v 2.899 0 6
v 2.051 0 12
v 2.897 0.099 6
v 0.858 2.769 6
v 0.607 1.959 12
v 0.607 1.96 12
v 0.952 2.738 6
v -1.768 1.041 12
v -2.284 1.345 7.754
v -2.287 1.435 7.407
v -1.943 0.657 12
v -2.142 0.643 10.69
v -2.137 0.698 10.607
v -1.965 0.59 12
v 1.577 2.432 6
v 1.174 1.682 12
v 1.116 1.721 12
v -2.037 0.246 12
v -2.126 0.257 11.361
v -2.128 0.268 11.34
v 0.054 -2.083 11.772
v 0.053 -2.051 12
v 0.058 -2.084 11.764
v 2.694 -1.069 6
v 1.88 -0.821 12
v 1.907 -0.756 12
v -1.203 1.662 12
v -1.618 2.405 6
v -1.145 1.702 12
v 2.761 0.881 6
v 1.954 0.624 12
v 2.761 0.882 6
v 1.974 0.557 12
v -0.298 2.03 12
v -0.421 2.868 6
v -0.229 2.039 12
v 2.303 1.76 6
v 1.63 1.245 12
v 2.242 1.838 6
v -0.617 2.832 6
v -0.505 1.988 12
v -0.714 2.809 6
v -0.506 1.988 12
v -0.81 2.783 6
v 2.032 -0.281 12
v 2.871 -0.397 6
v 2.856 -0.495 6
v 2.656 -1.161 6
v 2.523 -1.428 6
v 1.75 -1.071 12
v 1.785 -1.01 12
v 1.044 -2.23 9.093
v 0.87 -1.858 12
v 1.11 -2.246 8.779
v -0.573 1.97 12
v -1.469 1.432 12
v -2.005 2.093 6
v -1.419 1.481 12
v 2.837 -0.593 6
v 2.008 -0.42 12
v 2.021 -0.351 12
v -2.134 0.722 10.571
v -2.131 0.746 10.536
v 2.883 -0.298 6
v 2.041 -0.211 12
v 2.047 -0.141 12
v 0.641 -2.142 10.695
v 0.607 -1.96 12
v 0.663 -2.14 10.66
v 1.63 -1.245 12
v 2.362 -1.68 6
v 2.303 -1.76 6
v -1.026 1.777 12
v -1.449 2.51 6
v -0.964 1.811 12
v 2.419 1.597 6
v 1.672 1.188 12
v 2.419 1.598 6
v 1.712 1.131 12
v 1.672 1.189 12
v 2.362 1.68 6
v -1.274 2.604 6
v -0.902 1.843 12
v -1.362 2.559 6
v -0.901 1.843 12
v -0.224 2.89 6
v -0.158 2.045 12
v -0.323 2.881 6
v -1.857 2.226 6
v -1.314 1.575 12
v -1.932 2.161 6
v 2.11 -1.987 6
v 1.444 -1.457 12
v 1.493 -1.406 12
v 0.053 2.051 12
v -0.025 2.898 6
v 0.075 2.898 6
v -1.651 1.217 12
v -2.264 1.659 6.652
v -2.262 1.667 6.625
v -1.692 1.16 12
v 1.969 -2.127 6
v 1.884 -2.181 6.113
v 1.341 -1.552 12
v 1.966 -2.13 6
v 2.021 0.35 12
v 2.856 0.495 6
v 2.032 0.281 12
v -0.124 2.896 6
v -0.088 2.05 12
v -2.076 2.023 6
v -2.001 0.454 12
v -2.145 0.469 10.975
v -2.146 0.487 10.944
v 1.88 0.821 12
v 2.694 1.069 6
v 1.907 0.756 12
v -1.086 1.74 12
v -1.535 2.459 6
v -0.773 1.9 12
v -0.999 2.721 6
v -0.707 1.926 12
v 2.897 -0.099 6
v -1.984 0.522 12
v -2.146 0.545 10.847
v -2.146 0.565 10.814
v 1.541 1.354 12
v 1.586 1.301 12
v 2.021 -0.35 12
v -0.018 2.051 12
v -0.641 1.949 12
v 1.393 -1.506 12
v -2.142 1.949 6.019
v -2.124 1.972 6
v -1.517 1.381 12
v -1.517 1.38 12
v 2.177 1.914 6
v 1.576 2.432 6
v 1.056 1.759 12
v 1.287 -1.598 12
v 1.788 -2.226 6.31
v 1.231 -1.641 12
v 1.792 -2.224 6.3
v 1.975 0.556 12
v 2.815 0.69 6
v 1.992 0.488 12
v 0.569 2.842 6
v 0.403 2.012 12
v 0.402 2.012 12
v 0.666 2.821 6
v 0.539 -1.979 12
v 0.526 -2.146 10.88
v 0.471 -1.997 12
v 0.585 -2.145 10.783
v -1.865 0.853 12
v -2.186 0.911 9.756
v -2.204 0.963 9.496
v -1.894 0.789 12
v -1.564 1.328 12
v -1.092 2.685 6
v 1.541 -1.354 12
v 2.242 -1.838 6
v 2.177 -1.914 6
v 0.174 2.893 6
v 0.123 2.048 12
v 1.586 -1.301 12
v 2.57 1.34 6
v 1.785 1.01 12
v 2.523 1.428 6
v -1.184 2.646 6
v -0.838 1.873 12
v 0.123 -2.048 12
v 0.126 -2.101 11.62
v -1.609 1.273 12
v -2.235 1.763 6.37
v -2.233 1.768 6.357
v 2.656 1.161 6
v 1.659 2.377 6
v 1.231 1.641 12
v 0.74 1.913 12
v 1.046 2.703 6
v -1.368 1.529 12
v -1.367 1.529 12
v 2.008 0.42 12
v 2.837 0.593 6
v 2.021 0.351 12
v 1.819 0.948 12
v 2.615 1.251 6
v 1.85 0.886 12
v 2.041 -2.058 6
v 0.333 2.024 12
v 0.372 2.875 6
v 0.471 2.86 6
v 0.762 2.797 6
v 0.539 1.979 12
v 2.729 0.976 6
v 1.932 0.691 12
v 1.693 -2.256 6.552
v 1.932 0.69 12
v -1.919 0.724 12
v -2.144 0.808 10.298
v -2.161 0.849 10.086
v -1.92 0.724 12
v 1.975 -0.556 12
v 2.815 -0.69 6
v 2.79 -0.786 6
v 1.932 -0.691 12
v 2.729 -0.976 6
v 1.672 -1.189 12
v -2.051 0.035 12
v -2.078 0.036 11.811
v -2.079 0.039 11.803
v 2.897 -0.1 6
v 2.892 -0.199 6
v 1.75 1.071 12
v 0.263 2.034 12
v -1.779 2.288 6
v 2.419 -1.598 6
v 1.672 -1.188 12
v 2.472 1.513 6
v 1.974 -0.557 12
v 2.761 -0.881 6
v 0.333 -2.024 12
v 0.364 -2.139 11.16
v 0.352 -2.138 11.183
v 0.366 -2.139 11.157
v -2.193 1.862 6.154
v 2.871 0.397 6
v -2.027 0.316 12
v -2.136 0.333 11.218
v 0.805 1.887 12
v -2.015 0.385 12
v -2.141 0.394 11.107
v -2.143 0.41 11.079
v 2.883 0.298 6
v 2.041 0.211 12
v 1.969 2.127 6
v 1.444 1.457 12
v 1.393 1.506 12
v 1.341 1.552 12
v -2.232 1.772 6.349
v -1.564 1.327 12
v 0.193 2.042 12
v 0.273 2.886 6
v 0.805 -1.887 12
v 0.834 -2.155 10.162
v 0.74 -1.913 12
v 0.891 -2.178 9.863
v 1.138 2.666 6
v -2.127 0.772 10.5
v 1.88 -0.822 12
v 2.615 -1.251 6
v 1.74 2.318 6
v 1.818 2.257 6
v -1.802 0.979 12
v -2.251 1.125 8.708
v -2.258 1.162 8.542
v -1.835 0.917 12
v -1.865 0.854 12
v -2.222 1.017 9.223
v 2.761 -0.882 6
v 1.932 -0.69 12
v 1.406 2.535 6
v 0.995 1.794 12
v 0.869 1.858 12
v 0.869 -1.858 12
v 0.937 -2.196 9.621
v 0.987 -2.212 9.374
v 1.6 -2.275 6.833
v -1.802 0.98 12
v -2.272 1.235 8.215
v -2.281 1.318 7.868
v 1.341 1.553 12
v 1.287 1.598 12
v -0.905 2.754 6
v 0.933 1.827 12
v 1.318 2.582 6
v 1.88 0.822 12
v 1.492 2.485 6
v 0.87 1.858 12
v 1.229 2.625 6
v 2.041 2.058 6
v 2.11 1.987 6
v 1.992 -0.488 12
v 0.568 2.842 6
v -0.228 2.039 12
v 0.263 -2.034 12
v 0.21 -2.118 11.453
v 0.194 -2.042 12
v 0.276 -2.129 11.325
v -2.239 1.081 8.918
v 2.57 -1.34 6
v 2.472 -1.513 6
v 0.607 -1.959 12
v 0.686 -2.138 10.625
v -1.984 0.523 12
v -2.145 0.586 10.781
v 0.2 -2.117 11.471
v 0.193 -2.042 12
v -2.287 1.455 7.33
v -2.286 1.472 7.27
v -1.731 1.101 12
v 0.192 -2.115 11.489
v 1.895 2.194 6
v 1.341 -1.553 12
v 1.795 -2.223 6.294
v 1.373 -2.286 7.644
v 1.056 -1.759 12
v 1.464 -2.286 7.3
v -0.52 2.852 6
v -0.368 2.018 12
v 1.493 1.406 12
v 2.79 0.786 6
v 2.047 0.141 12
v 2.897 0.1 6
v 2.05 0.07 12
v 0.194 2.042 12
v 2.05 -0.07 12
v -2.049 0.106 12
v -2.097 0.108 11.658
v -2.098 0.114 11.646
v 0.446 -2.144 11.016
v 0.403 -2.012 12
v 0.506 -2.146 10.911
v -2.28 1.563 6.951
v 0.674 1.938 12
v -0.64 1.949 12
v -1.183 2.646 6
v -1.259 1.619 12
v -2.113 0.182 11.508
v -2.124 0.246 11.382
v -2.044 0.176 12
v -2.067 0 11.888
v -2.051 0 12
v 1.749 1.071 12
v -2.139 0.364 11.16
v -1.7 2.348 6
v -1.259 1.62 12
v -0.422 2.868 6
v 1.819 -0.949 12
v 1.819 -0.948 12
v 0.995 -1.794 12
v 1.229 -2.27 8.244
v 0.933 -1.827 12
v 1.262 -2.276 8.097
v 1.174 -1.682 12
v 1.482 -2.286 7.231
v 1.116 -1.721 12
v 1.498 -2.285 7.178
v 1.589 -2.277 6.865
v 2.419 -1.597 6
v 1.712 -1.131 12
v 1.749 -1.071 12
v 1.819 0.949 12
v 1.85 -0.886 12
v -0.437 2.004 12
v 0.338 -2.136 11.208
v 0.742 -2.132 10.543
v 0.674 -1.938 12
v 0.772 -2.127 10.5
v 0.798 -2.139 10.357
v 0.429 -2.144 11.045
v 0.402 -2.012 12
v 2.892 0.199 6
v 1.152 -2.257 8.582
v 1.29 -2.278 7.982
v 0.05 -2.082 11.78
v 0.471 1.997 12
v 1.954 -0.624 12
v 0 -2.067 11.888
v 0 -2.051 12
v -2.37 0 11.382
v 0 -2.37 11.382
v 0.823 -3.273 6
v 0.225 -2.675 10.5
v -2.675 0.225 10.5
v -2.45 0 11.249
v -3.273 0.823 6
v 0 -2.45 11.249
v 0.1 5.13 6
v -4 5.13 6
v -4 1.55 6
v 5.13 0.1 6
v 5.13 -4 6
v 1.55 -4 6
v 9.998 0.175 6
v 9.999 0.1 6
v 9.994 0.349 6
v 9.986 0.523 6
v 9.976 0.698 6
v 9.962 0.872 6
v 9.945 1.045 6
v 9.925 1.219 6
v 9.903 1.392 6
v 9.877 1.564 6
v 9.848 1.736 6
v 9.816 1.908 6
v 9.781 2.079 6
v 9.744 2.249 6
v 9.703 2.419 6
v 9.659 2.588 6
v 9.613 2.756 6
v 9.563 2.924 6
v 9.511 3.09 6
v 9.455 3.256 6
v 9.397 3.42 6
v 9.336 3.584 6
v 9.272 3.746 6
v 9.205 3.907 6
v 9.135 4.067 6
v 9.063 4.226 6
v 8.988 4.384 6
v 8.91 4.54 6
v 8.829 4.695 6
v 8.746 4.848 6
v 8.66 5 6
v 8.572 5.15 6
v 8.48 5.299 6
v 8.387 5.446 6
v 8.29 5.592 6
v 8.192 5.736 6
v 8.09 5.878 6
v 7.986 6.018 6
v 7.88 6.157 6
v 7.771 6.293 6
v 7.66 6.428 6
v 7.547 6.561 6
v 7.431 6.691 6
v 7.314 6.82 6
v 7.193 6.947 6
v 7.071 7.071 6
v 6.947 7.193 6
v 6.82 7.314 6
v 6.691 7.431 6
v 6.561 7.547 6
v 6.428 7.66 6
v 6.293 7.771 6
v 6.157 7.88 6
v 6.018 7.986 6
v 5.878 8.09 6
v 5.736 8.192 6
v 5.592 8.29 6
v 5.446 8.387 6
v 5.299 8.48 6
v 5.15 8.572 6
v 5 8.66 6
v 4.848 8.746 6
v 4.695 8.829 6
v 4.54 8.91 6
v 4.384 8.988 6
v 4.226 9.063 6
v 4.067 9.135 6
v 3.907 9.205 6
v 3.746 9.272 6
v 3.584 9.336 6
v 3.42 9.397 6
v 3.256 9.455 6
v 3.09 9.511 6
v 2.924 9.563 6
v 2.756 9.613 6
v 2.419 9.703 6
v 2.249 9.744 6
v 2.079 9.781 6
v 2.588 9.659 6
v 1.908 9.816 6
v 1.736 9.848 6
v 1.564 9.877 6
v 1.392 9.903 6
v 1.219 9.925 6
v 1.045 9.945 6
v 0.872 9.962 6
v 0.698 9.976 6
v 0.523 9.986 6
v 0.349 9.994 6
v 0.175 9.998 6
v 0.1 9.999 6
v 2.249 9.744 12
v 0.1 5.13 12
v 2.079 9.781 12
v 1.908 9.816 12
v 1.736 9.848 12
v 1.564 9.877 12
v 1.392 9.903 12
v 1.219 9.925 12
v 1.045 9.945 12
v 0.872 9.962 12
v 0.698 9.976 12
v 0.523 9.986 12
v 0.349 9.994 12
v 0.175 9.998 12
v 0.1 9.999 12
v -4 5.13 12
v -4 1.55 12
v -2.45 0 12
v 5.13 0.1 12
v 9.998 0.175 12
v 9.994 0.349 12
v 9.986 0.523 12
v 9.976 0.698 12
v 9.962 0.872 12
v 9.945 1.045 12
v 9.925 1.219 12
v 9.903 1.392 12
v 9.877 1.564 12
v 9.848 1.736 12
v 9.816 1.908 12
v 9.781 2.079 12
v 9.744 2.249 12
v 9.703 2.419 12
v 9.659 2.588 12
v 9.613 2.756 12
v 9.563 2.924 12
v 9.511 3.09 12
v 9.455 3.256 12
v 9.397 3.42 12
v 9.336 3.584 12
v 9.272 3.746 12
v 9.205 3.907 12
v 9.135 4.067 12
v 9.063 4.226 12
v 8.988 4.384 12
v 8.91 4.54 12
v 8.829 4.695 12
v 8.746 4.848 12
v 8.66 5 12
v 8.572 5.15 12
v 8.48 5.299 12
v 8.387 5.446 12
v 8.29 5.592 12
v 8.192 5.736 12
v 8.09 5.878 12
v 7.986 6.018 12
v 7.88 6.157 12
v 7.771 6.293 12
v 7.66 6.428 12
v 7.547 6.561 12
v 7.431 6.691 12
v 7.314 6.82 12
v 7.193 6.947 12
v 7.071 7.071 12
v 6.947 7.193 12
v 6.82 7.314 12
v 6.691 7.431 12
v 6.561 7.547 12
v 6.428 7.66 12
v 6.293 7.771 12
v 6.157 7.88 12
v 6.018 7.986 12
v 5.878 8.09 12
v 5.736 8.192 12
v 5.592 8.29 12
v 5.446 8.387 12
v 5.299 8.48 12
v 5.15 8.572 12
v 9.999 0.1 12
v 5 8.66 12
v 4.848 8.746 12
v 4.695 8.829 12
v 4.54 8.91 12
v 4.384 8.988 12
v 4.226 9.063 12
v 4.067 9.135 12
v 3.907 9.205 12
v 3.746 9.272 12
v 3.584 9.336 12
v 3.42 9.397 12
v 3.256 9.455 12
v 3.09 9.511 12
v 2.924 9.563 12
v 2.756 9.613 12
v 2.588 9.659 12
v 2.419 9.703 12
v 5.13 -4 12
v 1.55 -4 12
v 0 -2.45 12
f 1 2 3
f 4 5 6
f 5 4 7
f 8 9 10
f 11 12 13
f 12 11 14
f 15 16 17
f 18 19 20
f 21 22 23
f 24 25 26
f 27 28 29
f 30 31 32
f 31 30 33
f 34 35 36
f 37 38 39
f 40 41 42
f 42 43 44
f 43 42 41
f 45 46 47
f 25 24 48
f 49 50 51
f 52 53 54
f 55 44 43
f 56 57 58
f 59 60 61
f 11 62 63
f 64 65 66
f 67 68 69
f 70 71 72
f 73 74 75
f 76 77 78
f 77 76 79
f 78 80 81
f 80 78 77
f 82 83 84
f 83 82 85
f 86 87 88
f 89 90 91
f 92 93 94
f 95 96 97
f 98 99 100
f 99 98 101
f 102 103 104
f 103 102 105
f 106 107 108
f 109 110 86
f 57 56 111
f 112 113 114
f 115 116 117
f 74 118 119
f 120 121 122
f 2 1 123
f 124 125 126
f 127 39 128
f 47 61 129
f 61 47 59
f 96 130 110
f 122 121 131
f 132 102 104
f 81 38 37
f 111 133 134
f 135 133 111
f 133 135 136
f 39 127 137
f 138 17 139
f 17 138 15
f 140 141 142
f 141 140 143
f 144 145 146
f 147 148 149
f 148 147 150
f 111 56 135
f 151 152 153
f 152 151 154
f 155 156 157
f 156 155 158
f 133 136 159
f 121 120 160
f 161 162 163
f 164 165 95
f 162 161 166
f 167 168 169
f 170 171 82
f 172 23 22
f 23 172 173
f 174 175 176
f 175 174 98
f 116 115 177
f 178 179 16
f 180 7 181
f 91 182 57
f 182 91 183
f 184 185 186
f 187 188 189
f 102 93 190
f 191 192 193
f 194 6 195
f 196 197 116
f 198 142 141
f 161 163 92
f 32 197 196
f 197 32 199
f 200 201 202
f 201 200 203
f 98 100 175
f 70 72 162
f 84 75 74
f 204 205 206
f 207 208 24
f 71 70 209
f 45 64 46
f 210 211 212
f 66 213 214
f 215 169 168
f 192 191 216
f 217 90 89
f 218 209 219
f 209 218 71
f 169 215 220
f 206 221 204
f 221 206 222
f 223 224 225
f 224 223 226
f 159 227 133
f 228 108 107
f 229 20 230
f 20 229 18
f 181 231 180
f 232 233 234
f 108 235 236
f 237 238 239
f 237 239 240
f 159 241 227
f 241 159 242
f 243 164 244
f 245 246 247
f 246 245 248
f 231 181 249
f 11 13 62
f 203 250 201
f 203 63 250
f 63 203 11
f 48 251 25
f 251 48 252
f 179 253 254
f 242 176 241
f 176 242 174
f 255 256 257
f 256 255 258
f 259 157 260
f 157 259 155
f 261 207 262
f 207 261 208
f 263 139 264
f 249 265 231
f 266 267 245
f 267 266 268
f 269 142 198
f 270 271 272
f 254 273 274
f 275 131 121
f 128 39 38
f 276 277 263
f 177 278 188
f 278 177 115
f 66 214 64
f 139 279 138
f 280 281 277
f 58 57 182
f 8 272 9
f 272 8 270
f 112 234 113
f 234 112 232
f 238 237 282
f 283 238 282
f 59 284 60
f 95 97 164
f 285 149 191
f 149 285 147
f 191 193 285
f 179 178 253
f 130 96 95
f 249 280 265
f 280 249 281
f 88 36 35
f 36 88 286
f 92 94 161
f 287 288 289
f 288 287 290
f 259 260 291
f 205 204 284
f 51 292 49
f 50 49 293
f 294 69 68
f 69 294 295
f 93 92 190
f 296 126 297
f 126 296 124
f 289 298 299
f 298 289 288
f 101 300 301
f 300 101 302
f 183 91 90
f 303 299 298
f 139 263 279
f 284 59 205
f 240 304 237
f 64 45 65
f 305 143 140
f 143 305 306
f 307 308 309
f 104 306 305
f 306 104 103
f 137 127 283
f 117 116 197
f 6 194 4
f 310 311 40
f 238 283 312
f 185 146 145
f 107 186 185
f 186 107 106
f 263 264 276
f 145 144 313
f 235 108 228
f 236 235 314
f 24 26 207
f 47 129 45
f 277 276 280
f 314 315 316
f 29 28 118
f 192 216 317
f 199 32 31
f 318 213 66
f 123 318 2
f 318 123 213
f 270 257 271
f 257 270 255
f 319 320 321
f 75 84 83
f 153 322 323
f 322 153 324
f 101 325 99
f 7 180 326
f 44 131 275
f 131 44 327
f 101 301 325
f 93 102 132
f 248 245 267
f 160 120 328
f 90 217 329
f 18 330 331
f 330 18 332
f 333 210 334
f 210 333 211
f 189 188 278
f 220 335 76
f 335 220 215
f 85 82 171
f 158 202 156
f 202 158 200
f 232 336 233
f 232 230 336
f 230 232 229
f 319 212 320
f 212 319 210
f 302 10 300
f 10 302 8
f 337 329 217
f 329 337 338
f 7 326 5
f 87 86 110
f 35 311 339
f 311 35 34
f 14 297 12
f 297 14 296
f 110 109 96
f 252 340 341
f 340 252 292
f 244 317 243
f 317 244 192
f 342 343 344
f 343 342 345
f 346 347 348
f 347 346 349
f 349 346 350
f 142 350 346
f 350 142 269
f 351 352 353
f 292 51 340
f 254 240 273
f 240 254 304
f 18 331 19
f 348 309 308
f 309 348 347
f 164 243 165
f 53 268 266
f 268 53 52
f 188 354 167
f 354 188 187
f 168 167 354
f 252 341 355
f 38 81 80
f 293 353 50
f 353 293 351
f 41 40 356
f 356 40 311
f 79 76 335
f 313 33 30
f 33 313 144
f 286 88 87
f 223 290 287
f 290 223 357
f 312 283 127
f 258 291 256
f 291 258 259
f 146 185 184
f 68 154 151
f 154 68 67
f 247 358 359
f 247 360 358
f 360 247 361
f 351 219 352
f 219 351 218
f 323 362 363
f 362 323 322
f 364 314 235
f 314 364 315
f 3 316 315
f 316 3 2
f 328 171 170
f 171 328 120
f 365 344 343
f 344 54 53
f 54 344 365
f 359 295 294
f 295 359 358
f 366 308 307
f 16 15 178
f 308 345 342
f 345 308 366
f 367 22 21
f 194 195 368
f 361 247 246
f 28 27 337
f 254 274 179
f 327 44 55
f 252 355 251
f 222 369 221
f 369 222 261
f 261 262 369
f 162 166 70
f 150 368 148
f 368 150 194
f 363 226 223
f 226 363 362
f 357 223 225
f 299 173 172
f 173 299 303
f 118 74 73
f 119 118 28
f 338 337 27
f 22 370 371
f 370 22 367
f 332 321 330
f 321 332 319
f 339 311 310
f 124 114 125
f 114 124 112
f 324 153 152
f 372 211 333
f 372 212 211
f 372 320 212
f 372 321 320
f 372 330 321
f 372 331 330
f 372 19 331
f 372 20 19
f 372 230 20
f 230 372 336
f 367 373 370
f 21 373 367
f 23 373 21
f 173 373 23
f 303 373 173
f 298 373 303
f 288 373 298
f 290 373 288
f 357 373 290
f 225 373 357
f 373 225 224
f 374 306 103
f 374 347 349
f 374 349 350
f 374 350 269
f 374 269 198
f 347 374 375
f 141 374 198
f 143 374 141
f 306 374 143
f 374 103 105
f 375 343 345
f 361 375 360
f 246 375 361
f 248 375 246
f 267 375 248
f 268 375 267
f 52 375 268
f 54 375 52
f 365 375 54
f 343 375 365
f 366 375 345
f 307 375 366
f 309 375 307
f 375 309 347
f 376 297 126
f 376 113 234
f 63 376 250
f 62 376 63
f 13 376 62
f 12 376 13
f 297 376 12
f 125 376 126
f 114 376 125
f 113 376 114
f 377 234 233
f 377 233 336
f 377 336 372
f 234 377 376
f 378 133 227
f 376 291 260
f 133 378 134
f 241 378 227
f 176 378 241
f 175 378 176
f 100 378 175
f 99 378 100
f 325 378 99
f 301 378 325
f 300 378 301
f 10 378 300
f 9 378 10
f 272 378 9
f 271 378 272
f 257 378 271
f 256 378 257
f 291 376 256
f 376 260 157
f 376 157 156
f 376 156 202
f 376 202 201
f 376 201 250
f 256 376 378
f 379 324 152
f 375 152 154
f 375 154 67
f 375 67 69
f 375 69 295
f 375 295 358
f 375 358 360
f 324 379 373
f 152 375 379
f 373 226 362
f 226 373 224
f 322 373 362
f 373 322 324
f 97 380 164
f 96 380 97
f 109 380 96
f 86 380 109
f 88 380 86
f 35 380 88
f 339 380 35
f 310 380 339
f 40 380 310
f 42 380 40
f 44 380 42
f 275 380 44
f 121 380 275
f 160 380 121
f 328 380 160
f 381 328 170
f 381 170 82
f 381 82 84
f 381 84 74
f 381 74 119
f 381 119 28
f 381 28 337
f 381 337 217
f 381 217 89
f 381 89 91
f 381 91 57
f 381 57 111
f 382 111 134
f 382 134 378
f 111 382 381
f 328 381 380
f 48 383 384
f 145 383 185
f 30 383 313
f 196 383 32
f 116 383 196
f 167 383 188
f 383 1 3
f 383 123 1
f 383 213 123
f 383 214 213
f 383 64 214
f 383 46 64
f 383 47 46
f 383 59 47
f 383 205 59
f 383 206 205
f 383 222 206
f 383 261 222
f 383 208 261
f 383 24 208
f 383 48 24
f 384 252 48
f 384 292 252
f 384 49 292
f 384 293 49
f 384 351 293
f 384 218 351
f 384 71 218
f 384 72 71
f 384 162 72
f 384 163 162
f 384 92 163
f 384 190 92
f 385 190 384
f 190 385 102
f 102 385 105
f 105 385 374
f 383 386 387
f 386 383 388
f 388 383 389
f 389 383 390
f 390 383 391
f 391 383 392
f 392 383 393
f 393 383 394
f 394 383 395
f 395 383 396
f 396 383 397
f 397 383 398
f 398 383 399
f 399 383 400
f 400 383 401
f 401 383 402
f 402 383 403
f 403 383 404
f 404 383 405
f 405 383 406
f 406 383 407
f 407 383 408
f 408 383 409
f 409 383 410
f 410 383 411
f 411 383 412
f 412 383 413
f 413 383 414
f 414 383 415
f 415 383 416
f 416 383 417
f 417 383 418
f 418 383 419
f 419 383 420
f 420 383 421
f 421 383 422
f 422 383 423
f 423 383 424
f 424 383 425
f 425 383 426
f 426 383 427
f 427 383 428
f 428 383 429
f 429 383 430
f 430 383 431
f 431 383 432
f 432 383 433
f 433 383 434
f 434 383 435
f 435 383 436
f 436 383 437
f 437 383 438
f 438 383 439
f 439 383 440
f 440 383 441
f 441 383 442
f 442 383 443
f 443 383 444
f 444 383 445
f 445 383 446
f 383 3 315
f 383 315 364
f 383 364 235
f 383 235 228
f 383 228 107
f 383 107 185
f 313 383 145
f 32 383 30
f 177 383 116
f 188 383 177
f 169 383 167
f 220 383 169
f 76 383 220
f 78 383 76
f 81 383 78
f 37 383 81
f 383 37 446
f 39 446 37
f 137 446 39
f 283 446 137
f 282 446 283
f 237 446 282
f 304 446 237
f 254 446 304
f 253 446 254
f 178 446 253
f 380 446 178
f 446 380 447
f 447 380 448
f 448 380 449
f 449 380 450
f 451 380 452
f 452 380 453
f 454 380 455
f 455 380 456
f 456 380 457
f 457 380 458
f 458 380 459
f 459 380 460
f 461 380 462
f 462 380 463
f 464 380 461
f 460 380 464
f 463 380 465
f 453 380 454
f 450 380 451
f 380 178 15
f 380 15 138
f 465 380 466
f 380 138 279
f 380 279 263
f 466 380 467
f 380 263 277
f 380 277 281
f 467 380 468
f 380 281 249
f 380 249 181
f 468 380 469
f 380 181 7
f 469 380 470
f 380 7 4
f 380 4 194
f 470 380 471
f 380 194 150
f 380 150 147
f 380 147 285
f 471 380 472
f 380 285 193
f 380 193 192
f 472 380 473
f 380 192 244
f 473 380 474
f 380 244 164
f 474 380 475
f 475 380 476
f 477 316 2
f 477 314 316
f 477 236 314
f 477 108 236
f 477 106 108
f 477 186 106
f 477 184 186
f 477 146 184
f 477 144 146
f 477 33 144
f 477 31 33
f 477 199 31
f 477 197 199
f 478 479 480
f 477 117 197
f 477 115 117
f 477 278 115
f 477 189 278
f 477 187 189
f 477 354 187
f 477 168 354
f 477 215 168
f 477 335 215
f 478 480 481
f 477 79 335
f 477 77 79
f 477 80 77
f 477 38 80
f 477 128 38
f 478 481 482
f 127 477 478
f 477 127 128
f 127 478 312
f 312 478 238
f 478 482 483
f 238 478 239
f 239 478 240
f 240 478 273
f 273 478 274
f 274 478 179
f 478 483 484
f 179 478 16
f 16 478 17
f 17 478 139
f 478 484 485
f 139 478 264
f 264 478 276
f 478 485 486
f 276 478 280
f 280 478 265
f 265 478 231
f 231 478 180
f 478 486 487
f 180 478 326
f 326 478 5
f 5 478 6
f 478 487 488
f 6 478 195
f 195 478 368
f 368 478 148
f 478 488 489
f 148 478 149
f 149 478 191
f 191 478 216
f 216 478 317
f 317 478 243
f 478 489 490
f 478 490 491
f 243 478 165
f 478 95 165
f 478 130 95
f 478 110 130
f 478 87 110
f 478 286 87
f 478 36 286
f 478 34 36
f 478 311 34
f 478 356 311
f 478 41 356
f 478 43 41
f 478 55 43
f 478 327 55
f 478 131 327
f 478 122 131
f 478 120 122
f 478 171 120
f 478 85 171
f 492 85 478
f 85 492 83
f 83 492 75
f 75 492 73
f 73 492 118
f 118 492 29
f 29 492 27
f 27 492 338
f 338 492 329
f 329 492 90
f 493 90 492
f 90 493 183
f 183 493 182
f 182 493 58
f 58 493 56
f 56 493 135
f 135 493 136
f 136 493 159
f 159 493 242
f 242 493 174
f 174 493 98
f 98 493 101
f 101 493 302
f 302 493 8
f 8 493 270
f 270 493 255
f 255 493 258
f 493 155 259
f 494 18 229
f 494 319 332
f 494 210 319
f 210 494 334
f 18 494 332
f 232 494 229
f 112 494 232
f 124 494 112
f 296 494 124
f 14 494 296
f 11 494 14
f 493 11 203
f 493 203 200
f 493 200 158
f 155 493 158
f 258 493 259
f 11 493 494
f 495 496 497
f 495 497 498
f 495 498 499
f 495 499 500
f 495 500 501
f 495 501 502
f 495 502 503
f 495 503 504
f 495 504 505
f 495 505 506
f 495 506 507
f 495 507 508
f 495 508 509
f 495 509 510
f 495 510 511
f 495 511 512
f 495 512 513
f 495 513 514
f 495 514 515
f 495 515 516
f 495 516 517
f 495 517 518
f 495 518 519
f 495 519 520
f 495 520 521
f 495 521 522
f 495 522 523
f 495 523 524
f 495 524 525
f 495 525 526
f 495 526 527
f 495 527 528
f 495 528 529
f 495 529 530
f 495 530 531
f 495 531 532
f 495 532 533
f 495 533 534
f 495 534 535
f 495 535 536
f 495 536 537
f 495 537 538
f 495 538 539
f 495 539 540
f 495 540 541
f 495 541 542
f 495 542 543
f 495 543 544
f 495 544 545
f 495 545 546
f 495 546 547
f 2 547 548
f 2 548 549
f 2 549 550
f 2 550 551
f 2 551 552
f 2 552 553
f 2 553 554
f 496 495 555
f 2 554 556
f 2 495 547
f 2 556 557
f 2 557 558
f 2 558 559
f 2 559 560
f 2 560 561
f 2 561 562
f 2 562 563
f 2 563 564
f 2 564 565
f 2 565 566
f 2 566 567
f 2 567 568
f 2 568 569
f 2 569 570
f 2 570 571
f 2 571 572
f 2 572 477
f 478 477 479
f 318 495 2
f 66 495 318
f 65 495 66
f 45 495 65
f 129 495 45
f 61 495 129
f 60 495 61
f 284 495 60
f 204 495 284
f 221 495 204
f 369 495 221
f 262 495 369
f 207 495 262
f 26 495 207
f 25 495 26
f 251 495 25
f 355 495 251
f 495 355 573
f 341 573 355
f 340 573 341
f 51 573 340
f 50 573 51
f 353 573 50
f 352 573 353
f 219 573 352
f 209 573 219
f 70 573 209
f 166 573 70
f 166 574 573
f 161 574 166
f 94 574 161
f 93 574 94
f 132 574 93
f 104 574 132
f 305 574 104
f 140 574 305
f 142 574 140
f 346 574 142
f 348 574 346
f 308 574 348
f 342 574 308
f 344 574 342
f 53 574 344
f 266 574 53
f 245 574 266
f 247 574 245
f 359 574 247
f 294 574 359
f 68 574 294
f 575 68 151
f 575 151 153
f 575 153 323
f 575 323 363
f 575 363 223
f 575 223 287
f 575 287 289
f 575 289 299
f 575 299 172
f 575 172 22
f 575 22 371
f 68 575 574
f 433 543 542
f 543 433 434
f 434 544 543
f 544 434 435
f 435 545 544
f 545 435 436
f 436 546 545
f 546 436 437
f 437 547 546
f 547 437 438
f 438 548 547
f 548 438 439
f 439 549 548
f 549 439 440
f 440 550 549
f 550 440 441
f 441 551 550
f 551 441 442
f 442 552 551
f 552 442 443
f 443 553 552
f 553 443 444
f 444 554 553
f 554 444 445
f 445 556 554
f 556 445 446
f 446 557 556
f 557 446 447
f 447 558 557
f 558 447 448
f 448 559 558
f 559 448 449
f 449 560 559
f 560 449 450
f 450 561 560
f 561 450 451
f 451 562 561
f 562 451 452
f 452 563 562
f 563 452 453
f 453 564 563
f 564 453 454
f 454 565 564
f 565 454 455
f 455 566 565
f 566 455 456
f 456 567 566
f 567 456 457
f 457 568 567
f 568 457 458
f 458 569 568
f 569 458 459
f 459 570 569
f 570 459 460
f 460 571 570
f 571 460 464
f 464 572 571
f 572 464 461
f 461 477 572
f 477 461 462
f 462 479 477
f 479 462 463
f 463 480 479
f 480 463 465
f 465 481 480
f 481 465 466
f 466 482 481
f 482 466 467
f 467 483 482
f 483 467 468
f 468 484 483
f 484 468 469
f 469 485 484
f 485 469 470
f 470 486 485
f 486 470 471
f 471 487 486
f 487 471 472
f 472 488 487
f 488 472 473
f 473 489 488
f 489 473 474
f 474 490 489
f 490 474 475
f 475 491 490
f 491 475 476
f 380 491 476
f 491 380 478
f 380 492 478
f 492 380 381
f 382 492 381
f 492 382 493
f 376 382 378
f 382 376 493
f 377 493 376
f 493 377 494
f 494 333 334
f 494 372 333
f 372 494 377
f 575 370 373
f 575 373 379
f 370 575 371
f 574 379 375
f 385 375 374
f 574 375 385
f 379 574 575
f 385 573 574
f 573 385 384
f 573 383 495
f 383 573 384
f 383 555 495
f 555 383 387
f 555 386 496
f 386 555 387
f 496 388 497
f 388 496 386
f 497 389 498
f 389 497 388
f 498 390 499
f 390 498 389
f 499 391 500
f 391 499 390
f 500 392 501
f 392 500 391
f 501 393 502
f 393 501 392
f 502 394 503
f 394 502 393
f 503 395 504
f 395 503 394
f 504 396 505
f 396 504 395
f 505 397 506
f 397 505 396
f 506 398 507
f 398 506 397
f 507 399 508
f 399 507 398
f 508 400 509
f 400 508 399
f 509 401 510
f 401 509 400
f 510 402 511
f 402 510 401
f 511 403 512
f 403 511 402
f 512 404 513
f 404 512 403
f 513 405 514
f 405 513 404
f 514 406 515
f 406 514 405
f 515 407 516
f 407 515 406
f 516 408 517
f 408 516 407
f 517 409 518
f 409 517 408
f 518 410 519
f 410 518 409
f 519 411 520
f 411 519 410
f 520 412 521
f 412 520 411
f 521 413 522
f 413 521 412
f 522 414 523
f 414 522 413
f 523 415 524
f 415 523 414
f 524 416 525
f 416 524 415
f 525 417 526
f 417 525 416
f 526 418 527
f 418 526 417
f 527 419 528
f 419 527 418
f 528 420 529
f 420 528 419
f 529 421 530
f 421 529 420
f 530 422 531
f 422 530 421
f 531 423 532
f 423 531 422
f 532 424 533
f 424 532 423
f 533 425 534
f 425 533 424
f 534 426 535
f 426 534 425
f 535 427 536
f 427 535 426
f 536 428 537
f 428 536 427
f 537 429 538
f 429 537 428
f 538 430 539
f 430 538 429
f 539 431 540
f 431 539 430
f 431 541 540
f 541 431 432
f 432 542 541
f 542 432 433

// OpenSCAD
// file: ../scad/shape_modifier_utils.scad
// Overlap used to break coincident faces in booleans. Subtracting a cut that lands
// exactly on a surface leaves zero-thickness geometry, which renders unpredictably and
// slices worse; every cut is extended by this much so the faces genuinely cross.
//
// A function rather than a variable: `use <...>` exports functions but not top-level
// variable assignments, and the sweep reaches these files through `use`. Twelve modules
// across four files each declared their own `eps = 0.01` before this existed.
function geometry_eps() = 0.01;

// Length for a *centred* cutting solid that must pass entirely through material of
// depth `extent`. A centred cut reaches half this each way, so the factor leaves 50%
// clearance beyond `extent` on both sides -- a cut that lands flush on a face produces
// a zero-thickness shell rather than a clean hole.
//
// Measured against the swept parameter space: the deepest thing any of these cuts must
// clear is one bulkhead_section, one bulkhead_thickness tall, so the margin is 0.5 *
// bulkhead_thickness everywhere and scales with the part. Interconnect bulkheads stack
// two sections, but each section's cuts are applied before stacking, so the stack is
// not what a cut has to span.
function through_cut(extent) = 3 * extent;

// Distance at which to place a mask vertex so it lies outside anything within `extent`
// of the origin. Used by the half-plane polygons that trim an octant down to its
// wedge, where the vertex position only has to be "far enough" to be off the part.
//
// Worst case across 412 valid combinations is 3.25 mm of clearance, at U=0.5 with 1 mm
// panel: the shape reaches panel_offset + panel_overlap = 6.75 mm while the mask sits
// at 10 mm. Positive everywhere, and the gap widens with U.
function mask_reach(extent) = 2 * extent;


module octant_to_full() {
    mirror_x() {
        mirror_y() {
            mirror_xy() {
                children();
            }
        }
    }
}

module mirror_x() {
    union() {
        children();
        mirror([-1,0,0]) {
            children();
        }
    }
    
}

module mirror_y() {
    union() {
        children();
        mirror([0,-1,0]) {
            children();
        }
    }
    
}

module mirror_xy() {
    union() {
        children();
        mirror([1,-1,0]) {
            children();
        }
    }
}

module corner_translate(unit_width, corner_radius) {
    translate([unit_width/2-corner_radius,unit_width/2-corner_radius,0]) {
        children();
    }
}

// Move an octant out to its corner, then mirror it into all four -- the standard way
// a bulkhead profile is built from the one octant that is actually drawn.
//
// Every `*_shape` wrapper in fuselage_bulkhead_geometry.scad had this same pair open-
// coded around its own `*_octant` call. The wrappers stay: they name the full shape as
// distinct from the octant, and they are what seven call sites across two files use.
// It is the repeated body that is worth removing, not the interface.
module octant_tiled(unit_width, corner_radius) {
    octant_to_full() {
        corner_translate(unit_width, corner_radius) {
            children();
        }
    }
}


// mask lower diagonal quadrant
module octant_mask(unit_width, corner_radius) {
    eps = geometry_eps();
    polygon([[corner_radius+eps,corner_radius],
            [corner_radius+eps,-unit_width/2-corner_radius],
            [-unit_width/2-corner_radius+eps,-unit_width/2-corner_radius]]);
}

// fillet inward
module fillet_inner(radius) {
    intersection() {
        offset(r = -radius) {
            // fillet outward as well to ensure we round off any inward fillet artifacts (from input boundaries that are closer than 2*radius)
            offset(r = 2*radius) {
                offset(r = -radius) {
                    children();
                }
            }
        }
        // guarantee that the resultant shape has not gone outside the boundaries of the input shape
        children();
    }
}

// fillet outward
module fillet_outer(radius) {
    union() {
        offset(r = -radius) {
            offset(r = radius) {
                children();
            }
        }
        // guarantee that the resultant shape has not erroded into the boundaries of teh input shape
        children();
    }
}
// main file
// Isolate corner_transition at the driver's parameters. It carries its own translate, so
// it lands at z = bulkhead_thickness .. 2*bulkhead_thickness without help.
$fa=1;
$fs=0.1;

use <../scad/fuselage_corner_geometry.scad>

U = 1.0;
bulkhead_thickness = 6;
corner_radius = 10*U;
longeron_radius = 2*U;
panel_thickness = 4.77;
panel_offset = 0;
panel_overlap = 4;
panel_tolerance = 0.1;
longeron_tolerance = 0.05;
greeble_thickness = 0.8;
greeble_nub_thickness = greeble_thickness;
greeble_tolerance = 0.05;
corner_tolerance = 0;
extrusion_width = 0.4;

corner_transition(U, bulkhead_thickness, corner_radius, panel_thickness, panel_offset,
                  panel_overlap, panel_tolerance, longeron_radius, longeron_tolerance,
                  greeble_thickness, greeble_nub_thickness, greeble_tolerance,
                  extrusion_width, corner_tolerance);
